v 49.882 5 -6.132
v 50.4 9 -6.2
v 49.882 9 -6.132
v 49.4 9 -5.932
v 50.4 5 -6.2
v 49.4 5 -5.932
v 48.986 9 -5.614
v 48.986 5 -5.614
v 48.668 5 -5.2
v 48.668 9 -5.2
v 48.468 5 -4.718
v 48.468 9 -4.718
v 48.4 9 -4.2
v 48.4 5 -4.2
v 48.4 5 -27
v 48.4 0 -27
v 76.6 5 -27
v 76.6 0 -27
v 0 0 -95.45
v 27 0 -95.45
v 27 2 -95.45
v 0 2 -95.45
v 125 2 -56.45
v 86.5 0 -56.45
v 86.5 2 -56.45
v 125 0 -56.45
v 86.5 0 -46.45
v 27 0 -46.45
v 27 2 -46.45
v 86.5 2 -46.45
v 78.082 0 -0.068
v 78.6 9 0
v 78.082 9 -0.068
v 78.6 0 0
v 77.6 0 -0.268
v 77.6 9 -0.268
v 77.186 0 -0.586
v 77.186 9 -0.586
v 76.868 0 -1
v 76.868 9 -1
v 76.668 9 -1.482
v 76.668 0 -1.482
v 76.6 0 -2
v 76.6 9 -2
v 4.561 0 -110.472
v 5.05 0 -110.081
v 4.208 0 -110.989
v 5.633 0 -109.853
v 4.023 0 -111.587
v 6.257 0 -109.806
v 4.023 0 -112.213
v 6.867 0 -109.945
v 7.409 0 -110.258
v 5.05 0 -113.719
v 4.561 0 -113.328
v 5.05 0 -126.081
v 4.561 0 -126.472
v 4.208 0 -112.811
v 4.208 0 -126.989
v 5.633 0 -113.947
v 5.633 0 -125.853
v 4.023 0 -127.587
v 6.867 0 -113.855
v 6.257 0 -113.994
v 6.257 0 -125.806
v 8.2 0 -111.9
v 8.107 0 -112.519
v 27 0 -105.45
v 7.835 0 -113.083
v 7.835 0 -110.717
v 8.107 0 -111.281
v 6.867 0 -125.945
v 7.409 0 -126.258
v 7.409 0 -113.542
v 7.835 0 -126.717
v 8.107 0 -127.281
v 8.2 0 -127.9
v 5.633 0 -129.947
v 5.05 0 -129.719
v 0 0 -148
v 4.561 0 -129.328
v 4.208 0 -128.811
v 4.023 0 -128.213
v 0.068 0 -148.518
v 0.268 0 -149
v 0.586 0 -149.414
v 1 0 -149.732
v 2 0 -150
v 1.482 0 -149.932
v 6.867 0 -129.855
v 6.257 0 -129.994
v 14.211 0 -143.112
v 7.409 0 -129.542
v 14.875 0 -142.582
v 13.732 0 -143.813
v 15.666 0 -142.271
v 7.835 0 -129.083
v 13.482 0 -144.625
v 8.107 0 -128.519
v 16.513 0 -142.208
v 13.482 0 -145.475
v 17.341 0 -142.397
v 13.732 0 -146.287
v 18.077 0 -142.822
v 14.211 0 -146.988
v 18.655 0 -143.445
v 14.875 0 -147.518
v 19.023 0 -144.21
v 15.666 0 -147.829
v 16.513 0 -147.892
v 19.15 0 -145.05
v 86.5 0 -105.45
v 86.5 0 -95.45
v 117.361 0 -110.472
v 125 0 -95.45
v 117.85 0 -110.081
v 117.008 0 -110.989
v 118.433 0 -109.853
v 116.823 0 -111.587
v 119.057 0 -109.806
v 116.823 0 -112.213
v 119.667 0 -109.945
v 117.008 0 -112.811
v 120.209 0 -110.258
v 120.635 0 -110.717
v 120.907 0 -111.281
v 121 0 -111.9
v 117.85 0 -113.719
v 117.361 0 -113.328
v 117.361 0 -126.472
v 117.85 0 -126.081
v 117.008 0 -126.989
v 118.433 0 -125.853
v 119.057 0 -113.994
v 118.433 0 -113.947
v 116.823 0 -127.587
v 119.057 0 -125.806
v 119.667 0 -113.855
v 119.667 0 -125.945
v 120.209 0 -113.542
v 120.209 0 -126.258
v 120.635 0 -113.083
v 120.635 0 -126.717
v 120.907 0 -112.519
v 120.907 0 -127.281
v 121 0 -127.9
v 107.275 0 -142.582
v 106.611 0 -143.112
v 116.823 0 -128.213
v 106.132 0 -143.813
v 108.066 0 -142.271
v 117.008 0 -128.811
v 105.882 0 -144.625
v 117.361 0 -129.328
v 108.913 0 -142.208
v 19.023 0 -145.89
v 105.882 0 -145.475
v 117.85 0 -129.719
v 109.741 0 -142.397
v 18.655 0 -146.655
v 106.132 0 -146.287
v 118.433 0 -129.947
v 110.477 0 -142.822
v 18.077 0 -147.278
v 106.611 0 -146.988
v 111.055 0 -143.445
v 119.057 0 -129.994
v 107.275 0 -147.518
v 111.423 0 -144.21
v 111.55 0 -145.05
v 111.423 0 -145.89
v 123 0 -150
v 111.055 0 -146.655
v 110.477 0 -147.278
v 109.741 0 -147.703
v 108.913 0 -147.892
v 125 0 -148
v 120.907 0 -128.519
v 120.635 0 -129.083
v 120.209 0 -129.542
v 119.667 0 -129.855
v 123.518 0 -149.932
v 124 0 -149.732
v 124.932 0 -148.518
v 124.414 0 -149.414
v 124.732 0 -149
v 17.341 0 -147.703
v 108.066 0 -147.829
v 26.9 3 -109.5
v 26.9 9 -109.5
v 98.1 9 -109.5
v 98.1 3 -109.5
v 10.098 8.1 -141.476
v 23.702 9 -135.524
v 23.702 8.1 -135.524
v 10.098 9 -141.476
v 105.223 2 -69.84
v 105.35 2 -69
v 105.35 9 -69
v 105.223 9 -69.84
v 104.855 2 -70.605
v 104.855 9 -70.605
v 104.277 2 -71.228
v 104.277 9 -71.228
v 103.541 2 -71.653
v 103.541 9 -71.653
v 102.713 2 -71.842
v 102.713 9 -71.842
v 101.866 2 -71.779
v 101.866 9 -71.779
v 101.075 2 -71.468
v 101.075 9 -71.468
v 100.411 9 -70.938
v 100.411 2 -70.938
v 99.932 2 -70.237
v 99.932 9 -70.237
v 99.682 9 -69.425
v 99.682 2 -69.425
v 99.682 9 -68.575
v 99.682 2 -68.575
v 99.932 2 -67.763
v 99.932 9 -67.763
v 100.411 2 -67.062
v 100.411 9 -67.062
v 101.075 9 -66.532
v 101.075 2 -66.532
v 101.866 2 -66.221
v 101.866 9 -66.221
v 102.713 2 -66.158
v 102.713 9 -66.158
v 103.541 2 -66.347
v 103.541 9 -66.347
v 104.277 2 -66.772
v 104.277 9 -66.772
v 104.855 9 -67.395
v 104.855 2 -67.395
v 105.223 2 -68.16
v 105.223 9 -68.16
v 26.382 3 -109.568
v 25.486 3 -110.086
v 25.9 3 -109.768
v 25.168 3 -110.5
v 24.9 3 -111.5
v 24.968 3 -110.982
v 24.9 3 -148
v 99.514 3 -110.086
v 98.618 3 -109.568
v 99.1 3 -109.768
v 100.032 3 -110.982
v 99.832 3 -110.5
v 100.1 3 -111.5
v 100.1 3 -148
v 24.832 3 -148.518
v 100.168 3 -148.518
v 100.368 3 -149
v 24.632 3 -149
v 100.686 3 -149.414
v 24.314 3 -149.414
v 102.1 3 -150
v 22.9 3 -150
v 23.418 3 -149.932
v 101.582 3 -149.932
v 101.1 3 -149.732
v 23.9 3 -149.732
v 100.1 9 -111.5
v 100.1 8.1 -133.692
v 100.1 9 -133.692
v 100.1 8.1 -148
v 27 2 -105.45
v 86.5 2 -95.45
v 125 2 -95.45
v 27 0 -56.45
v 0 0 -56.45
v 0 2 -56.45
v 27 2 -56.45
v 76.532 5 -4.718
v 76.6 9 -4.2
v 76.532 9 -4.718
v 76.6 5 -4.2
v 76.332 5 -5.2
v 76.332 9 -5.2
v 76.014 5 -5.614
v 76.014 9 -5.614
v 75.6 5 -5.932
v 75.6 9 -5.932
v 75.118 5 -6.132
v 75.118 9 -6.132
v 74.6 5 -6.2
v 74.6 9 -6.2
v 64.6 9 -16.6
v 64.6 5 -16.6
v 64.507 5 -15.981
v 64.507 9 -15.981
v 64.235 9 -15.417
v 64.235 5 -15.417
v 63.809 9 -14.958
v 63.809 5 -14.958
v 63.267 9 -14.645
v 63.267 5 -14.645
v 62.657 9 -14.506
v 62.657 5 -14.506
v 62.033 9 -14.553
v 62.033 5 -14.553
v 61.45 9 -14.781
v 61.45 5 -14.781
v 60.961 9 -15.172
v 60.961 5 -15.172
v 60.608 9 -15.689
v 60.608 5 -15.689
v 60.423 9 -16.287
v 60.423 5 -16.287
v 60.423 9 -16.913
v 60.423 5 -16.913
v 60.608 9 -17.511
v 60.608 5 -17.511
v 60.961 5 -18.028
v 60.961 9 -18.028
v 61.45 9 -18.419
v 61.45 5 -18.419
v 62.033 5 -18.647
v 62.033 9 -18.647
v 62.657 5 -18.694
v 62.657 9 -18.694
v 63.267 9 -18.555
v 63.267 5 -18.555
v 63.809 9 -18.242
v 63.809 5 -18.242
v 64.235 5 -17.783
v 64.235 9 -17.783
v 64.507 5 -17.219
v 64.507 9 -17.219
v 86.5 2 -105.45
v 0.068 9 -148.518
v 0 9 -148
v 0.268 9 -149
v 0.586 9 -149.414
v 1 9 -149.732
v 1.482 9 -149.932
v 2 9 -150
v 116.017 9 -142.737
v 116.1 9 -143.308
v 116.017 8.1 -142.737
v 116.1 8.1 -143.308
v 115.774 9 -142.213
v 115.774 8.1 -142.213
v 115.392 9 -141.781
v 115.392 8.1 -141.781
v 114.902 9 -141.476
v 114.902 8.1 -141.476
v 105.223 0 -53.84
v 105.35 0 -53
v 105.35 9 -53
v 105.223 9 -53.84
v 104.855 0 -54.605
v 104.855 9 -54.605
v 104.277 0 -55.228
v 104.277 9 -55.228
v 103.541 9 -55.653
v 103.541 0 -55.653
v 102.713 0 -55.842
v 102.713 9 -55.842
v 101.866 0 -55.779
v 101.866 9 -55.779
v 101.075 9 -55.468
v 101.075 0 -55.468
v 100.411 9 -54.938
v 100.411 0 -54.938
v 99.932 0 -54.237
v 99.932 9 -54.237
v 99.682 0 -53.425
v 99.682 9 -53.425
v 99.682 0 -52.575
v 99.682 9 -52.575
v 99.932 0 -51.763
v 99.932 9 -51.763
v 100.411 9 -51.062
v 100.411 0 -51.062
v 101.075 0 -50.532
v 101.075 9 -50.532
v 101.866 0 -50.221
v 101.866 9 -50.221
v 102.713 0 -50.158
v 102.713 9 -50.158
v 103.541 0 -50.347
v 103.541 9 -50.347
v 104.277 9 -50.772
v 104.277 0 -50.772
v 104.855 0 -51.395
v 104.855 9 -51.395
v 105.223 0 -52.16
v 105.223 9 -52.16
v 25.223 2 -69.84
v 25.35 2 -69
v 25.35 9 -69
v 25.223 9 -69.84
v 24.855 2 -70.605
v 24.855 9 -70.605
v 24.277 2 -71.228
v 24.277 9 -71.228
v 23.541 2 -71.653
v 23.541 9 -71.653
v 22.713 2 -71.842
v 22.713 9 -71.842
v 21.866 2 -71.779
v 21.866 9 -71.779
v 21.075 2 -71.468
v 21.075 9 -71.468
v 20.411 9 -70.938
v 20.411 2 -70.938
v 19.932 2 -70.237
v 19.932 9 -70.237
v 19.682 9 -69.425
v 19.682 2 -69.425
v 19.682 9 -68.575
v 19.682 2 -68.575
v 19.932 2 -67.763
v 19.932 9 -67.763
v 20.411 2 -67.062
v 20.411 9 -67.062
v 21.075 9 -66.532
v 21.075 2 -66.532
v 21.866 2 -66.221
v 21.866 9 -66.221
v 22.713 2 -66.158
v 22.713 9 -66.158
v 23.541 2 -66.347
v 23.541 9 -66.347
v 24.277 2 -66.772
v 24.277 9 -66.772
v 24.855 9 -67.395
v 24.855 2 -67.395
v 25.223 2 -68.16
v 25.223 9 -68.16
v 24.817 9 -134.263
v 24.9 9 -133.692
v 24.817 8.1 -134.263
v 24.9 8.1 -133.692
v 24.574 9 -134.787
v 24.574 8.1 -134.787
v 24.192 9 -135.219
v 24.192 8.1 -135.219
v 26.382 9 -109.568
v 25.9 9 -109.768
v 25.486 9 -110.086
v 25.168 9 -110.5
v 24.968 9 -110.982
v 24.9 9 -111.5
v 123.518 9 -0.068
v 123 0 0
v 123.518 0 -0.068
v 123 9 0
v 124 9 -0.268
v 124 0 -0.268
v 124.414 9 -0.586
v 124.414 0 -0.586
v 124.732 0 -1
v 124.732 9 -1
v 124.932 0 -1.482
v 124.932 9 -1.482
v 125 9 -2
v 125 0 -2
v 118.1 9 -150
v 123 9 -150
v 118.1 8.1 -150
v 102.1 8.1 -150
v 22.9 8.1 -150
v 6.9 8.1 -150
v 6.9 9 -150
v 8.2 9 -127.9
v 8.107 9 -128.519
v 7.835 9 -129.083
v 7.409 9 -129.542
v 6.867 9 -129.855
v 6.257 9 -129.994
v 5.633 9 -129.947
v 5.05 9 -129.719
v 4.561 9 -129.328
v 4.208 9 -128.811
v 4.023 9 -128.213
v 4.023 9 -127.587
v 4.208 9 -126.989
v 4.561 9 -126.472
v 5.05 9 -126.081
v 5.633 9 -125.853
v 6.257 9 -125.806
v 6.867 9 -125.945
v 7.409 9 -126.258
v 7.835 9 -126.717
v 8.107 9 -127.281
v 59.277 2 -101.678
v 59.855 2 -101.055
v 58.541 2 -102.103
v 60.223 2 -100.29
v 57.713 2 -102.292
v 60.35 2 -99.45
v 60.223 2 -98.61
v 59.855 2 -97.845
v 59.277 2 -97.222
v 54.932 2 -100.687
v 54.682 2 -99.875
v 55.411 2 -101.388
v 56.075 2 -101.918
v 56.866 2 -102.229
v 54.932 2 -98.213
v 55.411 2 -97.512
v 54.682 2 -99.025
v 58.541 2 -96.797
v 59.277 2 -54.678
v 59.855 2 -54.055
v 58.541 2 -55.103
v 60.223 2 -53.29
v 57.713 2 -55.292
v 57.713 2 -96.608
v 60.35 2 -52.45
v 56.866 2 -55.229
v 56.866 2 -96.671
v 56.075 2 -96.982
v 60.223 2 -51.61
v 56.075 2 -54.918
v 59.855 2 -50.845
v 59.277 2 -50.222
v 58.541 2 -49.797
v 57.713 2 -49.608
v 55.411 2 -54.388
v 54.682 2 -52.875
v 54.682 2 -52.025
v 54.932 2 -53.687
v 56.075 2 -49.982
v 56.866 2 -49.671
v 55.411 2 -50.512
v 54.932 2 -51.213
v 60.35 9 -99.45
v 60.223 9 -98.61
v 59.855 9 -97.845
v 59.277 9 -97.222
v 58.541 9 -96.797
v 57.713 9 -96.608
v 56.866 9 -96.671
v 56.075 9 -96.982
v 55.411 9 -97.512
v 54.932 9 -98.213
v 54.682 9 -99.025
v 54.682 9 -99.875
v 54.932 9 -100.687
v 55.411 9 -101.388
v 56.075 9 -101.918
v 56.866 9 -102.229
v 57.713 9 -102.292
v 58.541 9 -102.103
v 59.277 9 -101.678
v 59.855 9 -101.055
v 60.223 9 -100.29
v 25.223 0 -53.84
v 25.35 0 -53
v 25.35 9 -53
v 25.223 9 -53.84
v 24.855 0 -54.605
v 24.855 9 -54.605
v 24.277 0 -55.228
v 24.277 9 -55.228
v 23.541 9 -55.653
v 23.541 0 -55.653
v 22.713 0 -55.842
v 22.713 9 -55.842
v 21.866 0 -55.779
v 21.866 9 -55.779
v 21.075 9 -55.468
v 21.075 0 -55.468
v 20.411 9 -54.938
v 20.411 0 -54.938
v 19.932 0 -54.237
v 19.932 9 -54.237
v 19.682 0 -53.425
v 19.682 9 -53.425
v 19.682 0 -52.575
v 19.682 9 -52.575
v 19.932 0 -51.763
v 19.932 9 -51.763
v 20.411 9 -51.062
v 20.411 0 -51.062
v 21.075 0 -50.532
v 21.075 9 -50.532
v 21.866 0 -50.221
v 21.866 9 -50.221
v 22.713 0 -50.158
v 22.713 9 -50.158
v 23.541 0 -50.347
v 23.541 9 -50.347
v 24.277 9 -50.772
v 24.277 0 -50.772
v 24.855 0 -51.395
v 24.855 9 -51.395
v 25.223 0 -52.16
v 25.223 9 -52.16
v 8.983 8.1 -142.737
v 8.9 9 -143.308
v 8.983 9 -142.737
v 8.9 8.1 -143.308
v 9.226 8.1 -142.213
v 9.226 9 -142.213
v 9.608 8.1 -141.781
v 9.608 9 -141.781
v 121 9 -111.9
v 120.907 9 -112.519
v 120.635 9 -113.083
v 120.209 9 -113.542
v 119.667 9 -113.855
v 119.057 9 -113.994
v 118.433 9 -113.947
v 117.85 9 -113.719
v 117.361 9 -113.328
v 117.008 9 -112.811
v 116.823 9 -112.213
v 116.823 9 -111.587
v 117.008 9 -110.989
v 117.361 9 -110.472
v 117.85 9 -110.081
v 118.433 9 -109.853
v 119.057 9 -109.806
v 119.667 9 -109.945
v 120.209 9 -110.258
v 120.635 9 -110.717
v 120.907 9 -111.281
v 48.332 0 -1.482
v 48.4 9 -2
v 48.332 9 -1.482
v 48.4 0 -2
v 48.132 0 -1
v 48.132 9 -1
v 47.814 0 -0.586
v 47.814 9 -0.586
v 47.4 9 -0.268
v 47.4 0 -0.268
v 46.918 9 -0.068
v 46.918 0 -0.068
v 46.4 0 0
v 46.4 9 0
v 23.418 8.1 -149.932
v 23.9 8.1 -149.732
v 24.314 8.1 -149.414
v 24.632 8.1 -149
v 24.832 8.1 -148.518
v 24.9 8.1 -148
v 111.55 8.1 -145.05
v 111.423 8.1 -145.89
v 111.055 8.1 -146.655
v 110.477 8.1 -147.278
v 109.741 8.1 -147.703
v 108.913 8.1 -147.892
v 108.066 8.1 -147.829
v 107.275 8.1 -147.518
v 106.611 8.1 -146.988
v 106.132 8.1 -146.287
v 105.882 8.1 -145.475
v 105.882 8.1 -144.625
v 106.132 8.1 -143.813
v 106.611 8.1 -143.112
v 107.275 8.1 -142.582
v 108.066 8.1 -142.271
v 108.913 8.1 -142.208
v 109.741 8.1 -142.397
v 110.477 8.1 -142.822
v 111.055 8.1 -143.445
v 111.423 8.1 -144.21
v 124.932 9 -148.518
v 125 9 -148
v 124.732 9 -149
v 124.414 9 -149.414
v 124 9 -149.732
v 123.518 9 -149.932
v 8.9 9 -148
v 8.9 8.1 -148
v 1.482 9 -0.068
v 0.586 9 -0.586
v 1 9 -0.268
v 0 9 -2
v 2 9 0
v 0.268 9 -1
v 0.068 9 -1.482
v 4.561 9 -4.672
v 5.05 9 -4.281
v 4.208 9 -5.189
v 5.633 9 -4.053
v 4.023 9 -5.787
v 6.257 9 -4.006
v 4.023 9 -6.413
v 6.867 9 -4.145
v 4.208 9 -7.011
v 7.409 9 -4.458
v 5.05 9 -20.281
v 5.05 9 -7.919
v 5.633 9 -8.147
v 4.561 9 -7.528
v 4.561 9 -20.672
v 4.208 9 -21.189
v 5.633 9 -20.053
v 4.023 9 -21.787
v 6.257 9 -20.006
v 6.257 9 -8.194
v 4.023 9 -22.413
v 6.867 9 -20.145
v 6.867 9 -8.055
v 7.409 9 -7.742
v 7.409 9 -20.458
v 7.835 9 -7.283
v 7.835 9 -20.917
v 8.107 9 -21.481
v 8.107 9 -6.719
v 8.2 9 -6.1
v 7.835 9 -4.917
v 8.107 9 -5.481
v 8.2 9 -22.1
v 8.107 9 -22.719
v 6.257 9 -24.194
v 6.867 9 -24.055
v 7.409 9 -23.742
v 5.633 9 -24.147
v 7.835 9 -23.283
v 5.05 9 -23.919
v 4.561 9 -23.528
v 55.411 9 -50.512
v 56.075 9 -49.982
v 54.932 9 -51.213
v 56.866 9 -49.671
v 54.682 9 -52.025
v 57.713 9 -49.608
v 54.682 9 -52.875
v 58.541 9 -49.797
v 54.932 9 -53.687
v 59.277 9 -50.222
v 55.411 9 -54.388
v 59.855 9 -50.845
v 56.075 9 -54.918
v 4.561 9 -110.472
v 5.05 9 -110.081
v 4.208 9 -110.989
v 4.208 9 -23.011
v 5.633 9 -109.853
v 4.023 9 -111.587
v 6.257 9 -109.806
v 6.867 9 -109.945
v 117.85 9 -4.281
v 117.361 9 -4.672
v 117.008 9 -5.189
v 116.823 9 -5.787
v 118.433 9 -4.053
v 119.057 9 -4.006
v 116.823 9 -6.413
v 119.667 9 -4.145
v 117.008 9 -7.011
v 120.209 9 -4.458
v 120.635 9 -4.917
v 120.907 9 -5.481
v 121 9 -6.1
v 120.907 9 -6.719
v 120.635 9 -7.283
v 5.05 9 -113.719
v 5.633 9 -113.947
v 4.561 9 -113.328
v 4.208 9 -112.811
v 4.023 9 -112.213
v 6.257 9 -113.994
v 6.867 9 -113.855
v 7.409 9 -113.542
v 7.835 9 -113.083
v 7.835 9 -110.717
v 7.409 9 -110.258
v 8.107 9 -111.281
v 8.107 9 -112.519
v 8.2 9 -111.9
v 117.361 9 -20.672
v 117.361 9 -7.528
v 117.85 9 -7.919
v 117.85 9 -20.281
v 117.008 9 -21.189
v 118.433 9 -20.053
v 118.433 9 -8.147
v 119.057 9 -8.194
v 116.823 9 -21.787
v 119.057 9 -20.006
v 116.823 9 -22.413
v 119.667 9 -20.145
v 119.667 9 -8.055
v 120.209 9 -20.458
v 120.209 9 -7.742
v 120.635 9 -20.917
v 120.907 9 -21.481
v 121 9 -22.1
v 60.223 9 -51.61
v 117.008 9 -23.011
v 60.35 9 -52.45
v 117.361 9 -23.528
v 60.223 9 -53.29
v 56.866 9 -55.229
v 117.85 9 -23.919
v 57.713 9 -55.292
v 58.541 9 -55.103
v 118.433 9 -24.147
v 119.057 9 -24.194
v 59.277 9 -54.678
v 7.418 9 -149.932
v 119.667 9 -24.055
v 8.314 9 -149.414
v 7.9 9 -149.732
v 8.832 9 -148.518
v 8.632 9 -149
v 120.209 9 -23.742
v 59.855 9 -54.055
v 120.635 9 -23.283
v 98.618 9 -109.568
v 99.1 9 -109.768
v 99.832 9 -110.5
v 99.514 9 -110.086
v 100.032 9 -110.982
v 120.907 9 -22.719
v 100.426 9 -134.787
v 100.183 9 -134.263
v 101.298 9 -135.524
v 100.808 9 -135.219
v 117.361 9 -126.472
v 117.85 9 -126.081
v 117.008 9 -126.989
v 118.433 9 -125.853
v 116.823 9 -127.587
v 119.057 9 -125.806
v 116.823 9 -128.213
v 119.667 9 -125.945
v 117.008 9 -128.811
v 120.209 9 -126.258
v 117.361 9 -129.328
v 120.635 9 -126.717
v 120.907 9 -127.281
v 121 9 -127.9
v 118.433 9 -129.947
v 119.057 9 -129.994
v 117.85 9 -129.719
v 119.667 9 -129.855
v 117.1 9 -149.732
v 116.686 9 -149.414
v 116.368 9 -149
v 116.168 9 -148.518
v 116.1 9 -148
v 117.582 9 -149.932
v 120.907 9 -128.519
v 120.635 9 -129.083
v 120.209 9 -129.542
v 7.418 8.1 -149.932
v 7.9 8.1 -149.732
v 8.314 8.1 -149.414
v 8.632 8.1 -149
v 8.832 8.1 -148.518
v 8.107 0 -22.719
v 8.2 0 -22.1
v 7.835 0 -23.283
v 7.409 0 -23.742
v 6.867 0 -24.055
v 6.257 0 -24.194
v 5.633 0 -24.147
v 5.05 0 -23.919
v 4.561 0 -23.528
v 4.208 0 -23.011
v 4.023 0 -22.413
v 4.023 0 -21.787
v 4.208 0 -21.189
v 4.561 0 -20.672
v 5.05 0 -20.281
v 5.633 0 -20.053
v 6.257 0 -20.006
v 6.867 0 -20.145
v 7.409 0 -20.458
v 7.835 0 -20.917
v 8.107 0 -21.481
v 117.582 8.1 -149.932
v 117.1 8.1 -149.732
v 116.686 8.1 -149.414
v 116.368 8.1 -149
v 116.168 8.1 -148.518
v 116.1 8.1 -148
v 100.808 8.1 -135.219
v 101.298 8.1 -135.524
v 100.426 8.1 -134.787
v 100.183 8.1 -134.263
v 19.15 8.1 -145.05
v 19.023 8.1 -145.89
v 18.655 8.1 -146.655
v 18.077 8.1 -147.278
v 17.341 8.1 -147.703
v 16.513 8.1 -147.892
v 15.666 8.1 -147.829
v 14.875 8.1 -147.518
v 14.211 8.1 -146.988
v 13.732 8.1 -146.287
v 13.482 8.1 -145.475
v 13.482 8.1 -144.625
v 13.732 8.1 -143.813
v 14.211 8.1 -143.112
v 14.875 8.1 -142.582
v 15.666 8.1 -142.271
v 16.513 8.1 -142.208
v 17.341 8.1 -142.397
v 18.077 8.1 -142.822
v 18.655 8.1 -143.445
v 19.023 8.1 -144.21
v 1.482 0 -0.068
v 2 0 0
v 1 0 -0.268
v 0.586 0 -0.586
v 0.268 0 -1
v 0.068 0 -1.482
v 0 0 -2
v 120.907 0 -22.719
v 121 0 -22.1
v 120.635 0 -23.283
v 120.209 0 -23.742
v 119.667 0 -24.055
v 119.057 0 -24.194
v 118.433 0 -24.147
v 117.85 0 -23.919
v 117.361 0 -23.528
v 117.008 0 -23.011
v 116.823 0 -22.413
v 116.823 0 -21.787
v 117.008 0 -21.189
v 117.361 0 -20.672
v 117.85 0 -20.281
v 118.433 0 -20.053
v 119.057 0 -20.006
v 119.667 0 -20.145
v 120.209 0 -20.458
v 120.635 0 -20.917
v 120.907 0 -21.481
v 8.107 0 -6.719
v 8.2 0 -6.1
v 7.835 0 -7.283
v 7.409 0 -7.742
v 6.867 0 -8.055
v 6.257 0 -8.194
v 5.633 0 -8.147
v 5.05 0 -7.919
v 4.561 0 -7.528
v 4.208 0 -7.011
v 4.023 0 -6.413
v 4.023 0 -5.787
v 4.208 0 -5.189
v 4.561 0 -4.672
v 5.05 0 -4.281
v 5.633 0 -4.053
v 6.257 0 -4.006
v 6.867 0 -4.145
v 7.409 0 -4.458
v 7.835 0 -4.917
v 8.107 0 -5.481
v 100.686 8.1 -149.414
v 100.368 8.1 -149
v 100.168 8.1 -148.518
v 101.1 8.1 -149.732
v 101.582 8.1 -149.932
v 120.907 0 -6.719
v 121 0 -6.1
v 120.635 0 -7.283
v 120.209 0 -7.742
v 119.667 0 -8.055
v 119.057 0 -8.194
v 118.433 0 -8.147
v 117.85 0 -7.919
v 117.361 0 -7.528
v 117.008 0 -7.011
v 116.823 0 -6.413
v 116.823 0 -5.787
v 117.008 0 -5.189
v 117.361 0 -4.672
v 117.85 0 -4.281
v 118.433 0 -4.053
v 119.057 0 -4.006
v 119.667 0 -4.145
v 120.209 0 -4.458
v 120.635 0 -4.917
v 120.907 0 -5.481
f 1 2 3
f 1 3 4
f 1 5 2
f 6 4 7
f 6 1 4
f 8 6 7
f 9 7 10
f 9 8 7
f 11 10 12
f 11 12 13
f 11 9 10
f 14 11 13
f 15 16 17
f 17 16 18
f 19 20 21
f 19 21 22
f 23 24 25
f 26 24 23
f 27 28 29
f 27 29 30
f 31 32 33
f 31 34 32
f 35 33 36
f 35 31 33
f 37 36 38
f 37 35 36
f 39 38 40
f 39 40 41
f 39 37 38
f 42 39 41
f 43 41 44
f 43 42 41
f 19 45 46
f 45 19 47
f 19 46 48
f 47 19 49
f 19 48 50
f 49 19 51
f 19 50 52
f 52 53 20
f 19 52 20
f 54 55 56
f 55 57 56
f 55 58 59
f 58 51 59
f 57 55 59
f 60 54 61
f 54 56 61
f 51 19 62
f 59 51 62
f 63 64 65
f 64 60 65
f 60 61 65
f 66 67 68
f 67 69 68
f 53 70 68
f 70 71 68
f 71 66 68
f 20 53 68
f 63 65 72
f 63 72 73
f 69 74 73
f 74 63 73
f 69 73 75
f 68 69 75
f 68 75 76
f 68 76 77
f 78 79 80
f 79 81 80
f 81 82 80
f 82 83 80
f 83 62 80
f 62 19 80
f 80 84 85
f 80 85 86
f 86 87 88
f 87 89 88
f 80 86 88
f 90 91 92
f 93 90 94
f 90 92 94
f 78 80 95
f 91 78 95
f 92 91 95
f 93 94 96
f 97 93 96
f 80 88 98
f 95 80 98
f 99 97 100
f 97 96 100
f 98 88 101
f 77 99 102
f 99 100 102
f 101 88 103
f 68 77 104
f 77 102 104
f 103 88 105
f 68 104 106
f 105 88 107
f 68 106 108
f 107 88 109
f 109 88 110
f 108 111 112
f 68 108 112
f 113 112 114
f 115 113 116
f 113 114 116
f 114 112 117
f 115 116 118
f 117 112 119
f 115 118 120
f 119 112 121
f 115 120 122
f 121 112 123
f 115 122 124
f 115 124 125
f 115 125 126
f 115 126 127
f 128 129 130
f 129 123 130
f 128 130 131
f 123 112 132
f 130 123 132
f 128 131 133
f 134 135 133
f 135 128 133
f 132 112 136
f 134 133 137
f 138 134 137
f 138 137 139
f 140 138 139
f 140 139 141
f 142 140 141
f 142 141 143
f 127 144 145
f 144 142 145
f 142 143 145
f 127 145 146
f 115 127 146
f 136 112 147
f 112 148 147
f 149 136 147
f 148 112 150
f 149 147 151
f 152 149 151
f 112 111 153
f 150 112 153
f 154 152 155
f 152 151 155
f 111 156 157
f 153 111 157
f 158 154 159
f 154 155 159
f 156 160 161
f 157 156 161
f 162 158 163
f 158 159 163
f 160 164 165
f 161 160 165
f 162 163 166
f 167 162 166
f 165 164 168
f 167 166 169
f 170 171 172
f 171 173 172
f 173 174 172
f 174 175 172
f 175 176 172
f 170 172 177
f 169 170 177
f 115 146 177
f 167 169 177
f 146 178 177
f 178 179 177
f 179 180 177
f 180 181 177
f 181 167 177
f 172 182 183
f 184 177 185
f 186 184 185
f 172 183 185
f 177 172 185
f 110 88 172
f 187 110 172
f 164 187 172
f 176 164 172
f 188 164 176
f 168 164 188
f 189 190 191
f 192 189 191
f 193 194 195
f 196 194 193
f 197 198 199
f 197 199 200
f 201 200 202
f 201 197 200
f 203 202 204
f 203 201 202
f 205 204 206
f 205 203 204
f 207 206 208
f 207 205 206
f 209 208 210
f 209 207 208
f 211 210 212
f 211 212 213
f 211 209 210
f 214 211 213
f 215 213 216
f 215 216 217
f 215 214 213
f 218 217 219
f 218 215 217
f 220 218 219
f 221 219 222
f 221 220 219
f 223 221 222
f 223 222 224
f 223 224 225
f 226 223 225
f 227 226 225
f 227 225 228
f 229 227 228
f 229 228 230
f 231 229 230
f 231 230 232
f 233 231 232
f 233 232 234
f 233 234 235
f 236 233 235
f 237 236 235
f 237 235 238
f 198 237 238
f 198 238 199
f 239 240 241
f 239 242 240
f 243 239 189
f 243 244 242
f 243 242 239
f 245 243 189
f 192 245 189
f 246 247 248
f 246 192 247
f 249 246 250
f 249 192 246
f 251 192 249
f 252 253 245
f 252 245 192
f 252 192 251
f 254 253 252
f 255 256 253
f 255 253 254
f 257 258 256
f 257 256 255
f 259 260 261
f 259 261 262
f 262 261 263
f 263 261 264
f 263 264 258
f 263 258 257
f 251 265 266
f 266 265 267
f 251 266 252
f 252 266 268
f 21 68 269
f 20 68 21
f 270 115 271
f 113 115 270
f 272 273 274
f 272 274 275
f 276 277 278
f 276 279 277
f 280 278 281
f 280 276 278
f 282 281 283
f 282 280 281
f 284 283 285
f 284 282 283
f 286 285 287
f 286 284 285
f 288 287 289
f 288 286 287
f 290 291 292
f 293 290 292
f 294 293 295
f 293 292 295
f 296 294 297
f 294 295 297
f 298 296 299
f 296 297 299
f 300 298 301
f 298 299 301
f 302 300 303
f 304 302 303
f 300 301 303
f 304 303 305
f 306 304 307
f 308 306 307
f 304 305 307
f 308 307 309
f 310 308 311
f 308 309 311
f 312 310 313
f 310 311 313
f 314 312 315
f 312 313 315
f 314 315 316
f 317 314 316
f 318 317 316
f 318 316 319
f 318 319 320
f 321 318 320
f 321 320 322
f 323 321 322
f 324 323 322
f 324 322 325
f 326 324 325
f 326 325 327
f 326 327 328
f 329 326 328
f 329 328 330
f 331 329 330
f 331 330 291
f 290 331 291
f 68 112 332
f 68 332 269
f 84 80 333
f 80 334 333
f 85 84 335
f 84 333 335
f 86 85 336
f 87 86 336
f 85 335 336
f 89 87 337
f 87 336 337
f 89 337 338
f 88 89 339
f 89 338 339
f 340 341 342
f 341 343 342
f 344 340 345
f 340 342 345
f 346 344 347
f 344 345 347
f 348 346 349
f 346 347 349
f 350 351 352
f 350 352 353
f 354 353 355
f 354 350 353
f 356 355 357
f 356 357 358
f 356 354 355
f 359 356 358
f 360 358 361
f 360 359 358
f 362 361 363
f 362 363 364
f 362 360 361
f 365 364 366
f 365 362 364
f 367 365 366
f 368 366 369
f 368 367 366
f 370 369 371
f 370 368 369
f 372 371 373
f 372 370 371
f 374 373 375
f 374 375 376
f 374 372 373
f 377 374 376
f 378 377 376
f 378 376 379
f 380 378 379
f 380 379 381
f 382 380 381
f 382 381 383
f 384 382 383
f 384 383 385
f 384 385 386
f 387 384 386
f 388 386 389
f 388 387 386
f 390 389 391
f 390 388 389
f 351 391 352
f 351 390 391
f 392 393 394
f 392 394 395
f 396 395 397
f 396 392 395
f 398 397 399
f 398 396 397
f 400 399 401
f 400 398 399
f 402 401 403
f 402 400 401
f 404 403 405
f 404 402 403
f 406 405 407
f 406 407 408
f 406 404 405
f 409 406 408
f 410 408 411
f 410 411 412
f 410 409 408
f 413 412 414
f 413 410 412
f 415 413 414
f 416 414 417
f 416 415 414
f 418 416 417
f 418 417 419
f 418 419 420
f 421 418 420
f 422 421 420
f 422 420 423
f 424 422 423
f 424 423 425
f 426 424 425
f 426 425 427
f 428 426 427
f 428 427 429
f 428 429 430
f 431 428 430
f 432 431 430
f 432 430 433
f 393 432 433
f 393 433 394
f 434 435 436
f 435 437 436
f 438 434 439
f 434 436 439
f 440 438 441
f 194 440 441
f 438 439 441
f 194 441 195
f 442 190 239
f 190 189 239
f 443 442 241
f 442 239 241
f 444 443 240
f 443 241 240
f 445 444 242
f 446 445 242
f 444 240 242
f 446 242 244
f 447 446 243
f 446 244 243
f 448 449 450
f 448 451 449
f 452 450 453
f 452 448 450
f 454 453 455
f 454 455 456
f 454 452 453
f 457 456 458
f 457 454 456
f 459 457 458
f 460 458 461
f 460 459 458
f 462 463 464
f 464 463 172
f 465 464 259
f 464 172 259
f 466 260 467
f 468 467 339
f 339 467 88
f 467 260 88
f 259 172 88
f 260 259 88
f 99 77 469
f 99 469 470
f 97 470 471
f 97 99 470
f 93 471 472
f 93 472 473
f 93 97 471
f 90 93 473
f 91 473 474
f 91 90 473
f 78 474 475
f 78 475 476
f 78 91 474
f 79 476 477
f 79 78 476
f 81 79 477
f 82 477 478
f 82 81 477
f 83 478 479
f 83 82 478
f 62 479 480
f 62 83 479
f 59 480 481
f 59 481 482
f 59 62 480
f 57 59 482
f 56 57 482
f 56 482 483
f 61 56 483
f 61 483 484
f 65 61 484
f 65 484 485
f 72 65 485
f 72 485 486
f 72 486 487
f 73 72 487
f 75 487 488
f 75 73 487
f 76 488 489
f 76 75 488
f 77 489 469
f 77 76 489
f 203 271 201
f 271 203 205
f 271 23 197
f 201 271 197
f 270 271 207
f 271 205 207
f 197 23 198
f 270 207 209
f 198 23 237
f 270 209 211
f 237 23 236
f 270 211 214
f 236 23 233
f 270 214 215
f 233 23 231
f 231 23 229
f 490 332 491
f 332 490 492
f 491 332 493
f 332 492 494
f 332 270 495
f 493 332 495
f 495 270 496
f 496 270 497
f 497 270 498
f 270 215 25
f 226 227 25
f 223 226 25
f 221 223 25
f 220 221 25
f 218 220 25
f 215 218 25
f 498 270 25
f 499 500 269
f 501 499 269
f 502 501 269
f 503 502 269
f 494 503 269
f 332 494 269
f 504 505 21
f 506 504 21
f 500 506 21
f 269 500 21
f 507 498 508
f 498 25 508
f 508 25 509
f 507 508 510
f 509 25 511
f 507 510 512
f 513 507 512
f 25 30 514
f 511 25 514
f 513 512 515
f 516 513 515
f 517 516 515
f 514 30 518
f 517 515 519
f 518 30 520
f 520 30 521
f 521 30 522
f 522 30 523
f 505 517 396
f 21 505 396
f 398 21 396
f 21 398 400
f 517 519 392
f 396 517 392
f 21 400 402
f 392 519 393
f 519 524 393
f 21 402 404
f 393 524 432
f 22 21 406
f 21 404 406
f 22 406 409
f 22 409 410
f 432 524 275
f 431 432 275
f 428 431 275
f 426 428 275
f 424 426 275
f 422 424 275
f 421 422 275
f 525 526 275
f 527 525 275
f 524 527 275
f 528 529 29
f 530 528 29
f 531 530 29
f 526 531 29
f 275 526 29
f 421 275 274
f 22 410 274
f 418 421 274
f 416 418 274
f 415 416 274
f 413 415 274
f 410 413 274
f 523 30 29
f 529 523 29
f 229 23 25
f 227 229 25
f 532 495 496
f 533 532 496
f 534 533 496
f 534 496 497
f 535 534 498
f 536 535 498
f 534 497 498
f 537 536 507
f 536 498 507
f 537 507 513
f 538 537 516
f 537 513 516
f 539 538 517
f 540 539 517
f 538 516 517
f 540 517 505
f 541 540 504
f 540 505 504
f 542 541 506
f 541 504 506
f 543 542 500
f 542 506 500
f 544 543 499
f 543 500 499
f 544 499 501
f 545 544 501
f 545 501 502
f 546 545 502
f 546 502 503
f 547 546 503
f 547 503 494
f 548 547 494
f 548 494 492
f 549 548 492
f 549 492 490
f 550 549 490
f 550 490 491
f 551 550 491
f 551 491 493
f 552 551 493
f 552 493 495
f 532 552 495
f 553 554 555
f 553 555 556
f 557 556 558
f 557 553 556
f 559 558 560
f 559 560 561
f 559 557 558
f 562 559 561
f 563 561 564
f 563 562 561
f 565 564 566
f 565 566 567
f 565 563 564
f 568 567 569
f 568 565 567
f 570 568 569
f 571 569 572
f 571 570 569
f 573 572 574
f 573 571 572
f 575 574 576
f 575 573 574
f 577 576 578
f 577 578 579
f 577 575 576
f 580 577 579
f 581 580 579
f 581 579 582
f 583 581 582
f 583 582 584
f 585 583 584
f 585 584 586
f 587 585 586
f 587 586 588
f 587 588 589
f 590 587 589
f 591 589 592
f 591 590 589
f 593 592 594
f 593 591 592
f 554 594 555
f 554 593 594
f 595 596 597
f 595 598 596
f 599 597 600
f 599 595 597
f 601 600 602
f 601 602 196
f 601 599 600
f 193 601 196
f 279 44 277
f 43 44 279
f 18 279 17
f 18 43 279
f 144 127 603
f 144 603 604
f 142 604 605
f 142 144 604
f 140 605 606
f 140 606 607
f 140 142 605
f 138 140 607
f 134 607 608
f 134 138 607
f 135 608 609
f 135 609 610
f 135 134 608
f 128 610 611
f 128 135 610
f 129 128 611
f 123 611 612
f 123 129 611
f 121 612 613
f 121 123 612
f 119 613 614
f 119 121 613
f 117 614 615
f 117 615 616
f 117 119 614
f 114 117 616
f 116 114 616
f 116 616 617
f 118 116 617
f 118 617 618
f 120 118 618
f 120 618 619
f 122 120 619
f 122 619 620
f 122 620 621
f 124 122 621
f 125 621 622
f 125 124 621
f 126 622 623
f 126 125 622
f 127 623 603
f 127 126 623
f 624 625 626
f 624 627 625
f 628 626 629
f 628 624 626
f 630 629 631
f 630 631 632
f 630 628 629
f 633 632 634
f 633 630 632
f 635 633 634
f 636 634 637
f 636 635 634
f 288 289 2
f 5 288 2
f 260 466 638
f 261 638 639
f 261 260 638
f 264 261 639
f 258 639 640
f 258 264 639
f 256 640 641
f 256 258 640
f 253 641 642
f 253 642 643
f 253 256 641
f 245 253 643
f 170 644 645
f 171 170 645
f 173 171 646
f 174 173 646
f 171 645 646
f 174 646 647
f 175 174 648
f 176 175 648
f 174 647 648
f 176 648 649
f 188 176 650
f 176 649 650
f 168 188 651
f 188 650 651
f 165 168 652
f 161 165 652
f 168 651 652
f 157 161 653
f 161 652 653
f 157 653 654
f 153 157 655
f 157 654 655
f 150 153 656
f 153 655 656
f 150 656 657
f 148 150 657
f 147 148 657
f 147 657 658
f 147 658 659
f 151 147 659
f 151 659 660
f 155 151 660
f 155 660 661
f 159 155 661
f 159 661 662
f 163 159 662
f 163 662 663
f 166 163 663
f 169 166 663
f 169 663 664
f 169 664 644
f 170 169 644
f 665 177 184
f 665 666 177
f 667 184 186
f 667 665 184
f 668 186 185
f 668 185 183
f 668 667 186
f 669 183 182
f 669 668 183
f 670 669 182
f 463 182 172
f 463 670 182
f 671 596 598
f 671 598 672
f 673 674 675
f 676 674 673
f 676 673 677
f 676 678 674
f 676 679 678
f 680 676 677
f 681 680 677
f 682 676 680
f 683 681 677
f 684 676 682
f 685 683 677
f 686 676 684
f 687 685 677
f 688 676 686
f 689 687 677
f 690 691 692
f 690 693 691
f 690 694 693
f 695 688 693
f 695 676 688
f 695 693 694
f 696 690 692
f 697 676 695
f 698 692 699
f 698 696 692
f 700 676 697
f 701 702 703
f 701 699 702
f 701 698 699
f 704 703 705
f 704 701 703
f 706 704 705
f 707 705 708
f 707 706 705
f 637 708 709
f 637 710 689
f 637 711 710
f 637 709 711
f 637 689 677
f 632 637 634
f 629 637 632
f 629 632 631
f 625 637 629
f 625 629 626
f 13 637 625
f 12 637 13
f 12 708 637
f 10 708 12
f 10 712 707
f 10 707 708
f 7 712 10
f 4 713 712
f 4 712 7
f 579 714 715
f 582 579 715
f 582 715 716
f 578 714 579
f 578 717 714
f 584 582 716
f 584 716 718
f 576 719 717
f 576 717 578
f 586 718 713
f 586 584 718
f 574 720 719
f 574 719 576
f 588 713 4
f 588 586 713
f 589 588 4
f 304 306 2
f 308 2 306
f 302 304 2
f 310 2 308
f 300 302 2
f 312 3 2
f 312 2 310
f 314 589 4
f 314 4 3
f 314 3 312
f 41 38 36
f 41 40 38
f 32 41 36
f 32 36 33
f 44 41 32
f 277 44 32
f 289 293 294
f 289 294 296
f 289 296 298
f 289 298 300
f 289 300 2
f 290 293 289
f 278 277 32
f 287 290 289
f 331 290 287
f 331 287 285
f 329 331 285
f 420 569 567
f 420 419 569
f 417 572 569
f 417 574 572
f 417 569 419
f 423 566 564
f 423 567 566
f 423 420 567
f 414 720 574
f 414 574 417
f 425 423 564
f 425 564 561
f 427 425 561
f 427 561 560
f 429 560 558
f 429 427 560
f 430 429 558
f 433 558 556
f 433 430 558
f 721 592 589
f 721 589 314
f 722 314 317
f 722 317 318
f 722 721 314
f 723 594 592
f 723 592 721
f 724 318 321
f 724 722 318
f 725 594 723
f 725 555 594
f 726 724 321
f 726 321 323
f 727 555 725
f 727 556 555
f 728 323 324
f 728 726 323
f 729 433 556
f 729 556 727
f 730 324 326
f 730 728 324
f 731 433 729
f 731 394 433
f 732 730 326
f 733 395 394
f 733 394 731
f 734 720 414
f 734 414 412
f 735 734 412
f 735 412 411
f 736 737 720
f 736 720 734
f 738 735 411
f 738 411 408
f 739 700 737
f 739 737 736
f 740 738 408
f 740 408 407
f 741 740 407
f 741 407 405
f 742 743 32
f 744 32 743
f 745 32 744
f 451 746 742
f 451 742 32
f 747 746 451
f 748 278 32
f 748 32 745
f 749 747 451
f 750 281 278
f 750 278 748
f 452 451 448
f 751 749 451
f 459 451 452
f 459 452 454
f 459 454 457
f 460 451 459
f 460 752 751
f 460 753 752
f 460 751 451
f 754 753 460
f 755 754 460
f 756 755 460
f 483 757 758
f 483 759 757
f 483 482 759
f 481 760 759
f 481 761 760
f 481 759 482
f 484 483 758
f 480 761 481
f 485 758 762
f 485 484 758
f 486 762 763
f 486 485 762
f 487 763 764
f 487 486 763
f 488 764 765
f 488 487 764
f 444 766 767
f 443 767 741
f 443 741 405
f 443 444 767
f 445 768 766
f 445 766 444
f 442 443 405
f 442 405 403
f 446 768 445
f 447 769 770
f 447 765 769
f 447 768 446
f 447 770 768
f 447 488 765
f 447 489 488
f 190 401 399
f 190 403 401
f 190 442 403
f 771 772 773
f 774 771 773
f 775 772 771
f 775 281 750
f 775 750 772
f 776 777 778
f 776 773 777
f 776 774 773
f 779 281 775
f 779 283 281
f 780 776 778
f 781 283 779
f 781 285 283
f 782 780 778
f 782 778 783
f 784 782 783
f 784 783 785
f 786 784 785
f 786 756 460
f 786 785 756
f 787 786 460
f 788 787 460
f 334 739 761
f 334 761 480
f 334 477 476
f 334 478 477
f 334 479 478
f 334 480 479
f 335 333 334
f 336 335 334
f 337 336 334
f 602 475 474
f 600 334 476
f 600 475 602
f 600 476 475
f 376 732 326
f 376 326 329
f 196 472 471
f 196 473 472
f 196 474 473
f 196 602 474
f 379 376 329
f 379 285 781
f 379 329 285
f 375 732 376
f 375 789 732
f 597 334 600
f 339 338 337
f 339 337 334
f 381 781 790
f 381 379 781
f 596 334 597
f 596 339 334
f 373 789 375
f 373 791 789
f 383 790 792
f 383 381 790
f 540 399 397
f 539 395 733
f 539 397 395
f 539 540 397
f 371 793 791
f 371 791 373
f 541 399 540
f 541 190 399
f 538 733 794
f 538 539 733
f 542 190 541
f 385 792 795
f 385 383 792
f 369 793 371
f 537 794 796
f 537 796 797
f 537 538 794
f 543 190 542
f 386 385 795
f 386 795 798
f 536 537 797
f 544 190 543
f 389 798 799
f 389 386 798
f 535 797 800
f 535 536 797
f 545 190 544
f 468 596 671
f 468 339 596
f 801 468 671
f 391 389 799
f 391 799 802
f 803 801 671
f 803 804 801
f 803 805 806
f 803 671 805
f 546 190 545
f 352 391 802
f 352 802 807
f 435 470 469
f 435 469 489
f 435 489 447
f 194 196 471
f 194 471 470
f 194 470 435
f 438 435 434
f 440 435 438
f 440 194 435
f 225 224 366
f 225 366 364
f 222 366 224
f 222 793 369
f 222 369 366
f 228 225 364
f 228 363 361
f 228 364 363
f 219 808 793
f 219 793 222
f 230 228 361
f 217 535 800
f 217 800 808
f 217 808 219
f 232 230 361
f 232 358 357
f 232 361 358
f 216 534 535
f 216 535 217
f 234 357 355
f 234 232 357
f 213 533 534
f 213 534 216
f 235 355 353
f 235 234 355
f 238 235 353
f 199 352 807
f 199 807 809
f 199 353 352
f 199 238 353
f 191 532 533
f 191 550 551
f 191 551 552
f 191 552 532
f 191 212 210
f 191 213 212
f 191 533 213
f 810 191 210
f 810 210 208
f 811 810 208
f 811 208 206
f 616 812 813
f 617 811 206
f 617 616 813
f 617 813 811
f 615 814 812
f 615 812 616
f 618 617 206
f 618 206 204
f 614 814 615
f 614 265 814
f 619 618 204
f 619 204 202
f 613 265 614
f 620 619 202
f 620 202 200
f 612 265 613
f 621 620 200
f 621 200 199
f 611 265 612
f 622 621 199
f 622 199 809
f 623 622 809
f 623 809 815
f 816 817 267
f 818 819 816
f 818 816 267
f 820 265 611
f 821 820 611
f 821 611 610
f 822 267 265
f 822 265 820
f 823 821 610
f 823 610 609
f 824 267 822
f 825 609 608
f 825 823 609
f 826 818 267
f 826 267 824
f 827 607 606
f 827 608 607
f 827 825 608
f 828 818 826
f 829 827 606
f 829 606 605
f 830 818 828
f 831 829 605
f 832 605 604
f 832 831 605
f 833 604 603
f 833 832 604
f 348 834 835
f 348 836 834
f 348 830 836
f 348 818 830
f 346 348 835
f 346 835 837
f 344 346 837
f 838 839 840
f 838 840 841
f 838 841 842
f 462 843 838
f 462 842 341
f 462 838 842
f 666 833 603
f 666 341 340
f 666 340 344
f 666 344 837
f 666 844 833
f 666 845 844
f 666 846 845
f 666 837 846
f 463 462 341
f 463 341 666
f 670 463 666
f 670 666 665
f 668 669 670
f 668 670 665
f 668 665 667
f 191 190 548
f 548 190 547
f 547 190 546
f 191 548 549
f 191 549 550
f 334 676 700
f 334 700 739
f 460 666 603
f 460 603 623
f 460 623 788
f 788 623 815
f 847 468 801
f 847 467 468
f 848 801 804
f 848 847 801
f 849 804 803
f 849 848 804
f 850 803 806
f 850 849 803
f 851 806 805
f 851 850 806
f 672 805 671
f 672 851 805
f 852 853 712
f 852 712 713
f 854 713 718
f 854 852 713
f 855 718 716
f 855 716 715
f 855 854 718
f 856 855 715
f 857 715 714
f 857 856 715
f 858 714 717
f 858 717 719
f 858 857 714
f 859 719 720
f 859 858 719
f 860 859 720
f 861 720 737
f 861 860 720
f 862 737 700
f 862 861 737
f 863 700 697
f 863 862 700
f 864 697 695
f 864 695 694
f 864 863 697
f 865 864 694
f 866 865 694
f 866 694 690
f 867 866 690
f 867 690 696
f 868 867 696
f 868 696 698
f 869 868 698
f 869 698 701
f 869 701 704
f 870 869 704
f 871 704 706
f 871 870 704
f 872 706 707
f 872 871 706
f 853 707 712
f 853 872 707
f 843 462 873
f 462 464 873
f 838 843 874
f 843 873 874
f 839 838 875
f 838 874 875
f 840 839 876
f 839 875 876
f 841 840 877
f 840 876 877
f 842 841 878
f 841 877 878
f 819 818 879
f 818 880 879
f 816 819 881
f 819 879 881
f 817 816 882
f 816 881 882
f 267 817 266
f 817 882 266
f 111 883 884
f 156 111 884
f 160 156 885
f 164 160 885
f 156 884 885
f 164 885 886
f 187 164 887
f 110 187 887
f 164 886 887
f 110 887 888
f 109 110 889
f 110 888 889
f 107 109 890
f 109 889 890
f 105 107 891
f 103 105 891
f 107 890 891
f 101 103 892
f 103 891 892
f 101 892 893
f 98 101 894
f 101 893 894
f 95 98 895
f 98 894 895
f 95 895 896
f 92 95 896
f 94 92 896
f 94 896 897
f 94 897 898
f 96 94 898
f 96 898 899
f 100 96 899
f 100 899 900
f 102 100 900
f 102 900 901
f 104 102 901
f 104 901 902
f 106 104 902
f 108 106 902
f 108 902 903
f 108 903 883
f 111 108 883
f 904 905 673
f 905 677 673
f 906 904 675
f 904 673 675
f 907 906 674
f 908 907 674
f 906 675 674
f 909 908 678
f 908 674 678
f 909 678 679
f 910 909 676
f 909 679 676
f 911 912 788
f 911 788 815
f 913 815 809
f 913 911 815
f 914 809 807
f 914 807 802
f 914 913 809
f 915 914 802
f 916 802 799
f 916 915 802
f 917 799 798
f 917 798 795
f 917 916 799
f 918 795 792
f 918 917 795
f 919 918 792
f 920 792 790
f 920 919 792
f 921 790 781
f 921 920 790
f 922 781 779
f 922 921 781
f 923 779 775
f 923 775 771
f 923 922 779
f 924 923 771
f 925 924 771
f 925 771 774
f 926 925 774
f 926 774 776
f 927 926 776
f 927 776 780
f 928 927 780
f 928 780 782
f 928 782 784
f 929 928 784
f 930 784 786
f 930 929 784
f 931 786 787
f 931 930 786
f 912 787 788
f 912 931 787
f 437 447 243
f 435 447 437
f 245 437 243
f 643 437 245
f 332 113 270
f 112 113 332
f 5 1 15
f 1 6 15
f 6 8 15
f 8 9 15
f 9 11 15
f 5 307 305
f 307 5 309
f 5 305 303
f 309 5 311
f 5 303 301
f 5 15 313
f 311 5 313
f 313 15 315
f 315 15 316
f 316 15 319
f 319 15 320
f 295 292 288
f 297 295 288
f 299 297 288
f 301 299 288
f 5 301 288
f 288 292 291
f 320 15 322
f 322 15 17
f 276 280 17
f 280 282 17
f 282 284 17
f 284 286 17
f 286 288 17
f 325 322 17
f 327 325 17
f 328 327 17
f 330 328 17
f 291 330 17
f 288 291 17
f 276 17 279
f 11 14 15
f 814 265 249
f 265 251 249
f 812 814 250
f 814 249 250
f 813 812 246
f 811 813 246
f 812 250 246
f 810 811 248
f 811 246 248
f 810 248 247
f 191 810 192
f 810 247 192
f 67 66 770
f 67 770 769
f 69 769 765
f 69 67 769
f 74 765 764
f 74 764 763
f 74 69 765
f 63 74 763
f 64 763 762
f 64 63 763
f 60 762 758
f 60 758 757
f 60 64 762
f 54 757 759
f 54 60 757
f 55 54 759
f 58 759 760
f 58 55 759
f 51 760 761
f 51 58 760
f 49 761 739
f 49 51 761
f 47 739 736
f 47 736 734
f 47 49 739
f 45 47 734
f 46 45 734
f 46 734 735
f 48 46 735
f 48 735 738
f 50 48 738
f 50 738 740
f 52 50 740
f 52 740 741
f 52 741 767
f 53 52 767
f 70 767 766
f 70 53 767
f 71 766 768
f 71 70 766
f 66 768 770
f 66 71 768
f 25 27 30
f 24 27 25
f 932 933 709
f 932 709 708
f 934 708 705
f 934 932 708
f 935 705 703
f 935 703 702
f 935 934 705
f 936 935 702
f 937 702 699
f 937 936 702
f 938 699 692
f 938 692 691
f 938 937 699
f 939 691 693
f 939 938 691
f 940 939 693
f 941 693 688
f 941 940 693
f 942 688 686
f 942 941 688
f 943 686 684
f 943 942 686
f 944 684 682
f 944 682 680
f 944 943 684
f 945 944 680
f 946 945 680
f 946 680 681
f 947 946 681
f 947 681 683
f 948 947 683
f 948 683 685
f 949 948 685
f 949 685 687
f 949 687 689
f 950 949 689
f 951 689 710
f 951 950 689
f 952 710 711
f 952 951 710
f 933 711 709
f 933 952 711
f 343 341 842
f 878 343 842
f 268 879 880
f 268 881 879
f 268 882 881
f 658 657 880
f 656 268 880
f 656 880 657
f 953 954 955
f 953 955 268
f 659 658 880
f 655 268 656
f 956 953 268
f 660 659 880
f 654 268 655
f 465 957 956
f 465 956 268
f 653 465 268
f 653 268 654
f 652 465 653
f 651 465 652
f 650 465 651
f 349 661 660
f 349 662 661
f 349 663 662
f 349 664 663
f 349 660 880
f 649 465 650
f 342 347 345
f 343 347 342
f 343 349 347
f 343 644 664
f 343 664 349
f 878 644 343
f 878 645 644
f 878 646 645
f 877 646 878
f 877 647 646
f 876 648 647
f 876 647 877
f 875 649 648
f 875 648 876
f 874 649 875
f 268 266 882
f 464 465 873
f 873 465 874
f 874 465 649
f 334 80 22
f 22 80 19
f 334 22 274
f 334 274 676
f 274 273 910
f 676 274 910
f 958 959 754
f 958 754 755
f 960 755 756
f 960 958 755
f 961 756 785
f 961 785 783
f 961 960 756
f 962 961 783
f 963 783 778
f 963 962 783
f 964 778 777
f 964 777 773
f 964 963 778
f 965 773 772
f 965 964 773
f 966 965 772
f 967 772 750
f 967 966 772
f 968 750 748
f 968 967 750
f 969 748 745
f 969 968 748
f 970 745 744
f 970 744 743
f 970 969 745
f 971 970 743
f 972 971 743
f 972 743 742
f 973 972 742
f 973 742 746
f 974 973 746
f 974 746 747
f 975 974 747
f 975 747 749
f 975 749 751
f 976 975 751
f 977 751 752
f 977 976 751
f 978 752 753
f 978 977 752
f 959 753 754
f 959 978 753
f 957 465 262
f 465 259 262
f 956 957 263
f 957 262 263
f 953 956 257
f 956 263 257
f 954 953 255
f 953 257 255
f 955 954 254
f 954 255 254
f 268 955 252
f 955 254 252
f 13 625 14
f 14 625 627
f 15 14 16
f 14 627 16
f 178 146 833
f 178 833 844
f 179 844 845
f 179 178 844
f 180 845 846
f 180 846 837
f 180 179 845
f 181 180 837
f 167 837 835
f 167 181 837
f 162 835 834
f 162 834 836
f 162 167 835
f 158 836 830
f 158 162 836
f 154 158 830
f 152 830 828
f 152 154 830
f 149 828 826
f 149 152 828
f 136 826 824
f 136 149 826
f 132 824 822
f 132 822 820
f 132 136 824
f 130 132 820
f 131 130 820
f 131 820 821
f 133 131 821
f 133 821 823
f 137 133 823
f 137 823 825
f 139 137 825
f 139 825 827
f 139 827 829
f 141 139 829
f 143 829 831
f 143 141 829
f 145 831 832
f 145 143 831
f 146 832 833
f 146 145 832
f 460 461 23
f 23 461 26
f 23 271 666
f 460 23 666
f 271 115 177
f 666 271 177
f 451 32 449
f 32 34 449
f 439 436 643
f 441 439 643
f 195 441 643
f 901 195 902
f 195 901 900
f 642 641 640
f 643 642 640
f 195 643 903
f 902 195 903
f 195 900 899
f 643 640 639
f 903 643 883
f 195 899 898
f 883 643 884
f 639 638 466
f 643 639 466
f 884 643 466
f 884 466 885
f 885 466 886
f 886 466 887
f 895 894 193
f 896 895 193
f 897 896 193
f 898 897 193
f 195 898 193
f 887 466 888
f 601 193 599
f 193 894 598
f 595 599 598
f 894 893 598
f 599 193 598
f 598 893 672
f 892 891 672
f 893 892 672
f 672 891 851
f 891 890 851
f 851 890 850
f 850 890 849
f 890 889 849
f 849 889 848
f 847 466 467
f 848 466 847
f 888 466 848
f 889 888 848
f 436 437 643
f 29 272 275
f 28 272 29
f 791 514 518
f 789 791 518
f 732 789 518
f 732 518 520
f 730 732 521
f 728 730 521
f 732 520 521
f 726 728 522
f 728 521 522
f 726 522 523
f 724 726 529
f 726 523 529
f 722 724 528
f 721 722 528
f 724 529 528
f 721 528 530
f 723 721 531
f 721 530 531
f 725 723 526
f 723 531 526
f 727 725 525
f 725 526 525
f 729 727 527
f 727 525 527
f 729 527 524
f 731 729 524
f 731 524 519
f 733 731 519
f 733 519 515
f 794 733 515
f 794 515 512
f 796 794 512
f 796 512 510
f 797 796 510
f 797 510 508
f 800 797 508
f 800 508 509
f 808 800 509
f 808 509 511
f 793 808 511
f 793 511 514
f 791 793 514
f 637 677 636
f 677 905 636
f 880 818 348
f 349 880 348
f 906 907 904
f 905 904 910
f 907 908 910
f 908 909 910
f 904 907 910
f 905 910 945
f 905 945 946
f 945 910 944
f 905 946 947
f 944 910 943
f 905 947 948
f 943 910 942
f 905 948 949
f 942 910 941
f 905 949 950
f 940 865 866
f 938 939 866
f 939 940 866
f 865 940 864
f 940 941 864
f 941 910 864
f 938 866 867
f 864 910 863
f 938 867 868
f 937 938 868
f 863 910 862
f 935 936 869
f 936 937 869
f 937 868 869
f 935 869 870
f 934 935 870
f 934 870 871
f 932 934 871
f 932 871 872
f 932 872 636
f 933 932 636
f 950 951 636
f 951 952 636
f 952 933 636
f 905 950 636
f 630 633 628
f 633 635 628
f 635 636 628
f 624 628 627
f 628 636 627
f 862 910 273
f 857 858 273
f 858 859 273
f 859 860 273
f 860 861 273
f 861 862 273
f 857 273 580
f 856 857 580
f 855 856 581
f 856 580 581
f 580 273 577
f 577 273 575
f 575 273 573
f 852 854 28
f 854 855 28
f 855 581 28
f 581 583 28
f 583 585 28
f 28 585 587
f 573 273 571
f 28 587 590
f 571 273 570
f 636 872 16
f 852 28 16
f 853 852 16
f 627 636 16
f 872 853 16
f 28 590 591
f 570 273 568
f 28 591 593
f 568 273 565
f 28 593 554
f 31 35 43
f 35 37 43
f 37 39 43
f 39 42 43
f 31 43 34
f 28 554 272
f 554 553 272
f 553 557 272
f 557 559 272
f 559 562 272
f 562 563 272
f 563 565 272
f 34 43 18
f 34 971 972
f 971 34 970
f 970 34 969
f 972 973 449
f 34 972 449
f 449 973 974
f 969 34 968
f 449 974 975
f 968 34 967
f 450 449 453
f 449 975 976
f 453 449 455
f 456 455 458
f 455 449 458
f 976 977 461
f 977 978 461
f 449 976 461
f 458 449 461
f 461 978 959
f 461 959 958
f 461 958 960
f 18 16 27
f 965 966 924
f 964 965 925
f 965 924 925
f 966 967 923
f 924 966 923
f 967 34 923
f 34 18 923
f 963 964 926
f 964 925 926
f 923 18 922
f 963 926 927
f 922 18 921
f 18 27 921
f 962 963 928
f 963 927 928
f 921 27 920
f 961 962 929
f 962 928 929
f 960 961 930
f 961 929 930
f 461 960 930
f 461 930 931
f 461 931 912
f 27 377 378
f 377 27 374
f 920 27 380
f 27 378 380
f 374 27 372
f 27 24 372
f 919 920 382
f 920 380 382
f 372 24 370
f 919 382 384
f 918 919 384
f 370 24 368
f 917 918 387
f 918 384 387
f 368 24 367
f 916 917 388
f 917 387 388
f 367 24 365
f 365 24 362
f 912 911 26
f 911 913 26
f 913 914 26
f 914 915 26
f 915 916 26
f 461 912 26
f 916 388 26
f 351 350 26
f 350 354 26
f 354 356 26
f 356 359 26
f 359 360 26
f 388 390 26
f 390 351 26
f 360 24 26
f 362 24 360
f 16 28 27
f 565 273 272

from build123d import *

# Parameters (mm, degrees)
SKETCH1_R           = 2.1
SKETCH1_R_2         = 2.85
BOSS_EXTRUDE1_DEPTH = 9
CUT_EXTRUDE1_DEPTH  = 4
SKETCH10_W          = 28.2
SKETCH10_H          = 42
CUT_EXTRUDE8_DEPTH  = 5
SKETCH11_R          = 2.1
CUT_EXTRUDE9_DEPTH  = 5
CUT_EXTRUDE2_DEPTH  = 2
SKETCH5_R           = 2.85
CUT_EXTRUDE3_DEPTH  = 8
SKETCH7_W           = 75.2
SKETCH7_H           = 40.5
CUT_EXTRUDE5_DEPTH  = 6
SKETCH12_R          = 2.85
CUT_EXTRUDE10_DEPTH = 10
CUT_EXTRUDE11_DEPTH = 0.9
FILLET1_R           = 2
FILLET2_R           = 2
FILLET3_R           = 2


with BuildPart() as part:
    # Sketch1 → Boss-Extrude1 (new body)
    with BuildSketch(Plane(origin=(0, 0, 0), x_dir=(1, 0, 0), z_dir=(0, 1, 0))):
        Polygon((76.6, 0), (125, 0), (125, 150), (0, 150), (0, 0), (48.4, 0), (48.4, -15), (76.6, -15), align=None)
        with Locations((6.1, 127.9)):
            Circle(SKETCH1_R, mode=Mode.SUBTRACT)
        with Locations((6.1, 111.9)):
            Circle(SKETCH1_R, mode=Mode.SUBTRACT)
        with Locations((118.9, 127.9)):
            Circle(SKETCH1_R, mode=Mode.SUBTRACT)
        with Locations((118.9, 111.9)):
            Circle(SKETCH1_R, mode=Mode.SUBTRACT)
        with Locations((118.9, 22.1)):
            Circle(SKETCH1_R, mode=Mode.SUBTRACT)
        with Locations((118.9, 6.1)):
            Circle(SKETCH1_R, mode=Mode.SUBTRACT)
        with Locations((6.1, 6.1)):
            Circle(SKETCH1_R, mode=Mode.SUBTRACT)
        with Locations((6.1, 22.1)):
            Circle(SKETCH1_R, mode=Mode.SUBTRACT)
        with Locations((54.5, -8.9)):
            Circle(SKETCH1_R, mode=Mode.SUBTRACT)
        with Locations((70.5, -8.9)):
            Circle(SKETCH1_R, mode=Mode.SUBTRACT)
        with Locations((62.5, -0.9)):
            Circle(SKETCH1_R, mode=Mode.SUBTRACT)
        with Locations((102.5, 53)):
            Circle(SKETCH1_R_2, mode=Mode.SUBTRACT)
        with Locations((22.5, 69)):
            Circle(SKETCH1_R_2, mode=Mode.SUBTRACT)
        with Locations((102.5, 69)):
            Circle(SKETCH1_R_2, mode=Mode.SUBTRACT)
        with Locations((22.5, 53)):
            Circle(SKETCH1_R_2, mode=Mode.SUBTRACT)
    extrude(amount=BOSS_EXTRUDE1_DEPTH)

    # Sketch2 → Cut-Extrude1 (cut)
    with BuildSketch(Plane(origin=(0, 9, 0), x_dir=(1, 0, 0), z_dir=(0, 1, 0))):
        Polygon((76.6, -15), (76.6, 0), (76.6, 6.2), (48.4, 6.2), (48.4, 0), (48.4, -15), align=None)
    extrude(amount=-CUT_EXTRUDE1_DEPTH, mode=Mode.SUBTRACT)

    # Sketch10 → Cut-Extrude8 (cut)
    with BuildSketch(Plane(origin=(0, 0, 0), x_dir=(1, 0, 0), z_dir=(0, 1, 0))):
        with Locations((62.5, 6)):
            Rectangle(SKETCH10_W, SKETCH10_H)
    extrude(amount=CUT_EXTRUDE8_DEPTH, mode=Mode.SUBTRACT)

    # Sketch11 → Cut-Extrude9 (cut, through all)
    with BuildSketch(Plane.XZ.offset(-5)):
        with Locations((62.5, -16.6)):
            Circle(SKETCH11_R)
    extrude(amount=-CUT_EXTRUDE9_DEPTH, mode=Mode.SUBTRACT)

    # Sketch3 → Cut-Extrude2 (cut)
    with BuildSketch(Plane.XZ):
        Polygon((0, -56.45), (27, -56.45), (27, -46.45), (86.5, -46.45), (86.5, -56.45), (125, -56.45), (125, -95.45), (86.5, -95.45), (86.5, -105.45), (27, -105.45), (27, -95.45), (0, -95.45), align=None)
    extrude(amount=-CUT_EXTRUDE2_DEPTH, mode=Mode.SUBTRACT)

    # Sketch5 → Cut-Extrude3 (cut, through all)
    with BuildSketch(Plane.XZ.offset(-2)):
        with Locations((57.5, -52.45)):
            Circle(SKETCH5_R)
        with Locations((57.5, -99.45)):
            Circle(SKETCH5_R)
    extrude(amount=-CUT_EXTRUDE3_DEPTH, mode=Mode.SUBTRACT)

    # Sketch7 → Cut-Extrude5 (cut)
    with BuildSketch(Plane(origin=(0, 9, 0), x_dir=(1, 0, 0), z_dir=(0, 1, 0))):
        with Locations((62.5, 129.75)):
            Rectangle(SKETCH7_W, SKETCH7_H)
    extrude(amount=-CUT_EXTRUDE5_DEPTH, mode=Mode.SUBTRACT)

    # Sketch12 → Cut-Extrude10 (cut, through all)
    with BuildSketch(Plane(origin=(0, 9, 0), x_dir=(1, 0, 0), z_dir=(0, 1, 0))):
        with Locations((16.3, 145.05)):
            Circle(SKETCH12_R)
        with Locations((108.7, 145.05)):
            Circle(SKETCH12_R)
    extrude(amount=-CUT_EXTRUDE10_DEPTH, mode=Mode.SUBTRACT)

    # Sketch13 → Cut-Extrude11 (cut)
    with BuildSketch(Plane(origin=(0, 9, 0), x_dir=(1, 0, 0), z_dir=(0, 1, 0))):
        Polygon((24.9, 135), (8.9, 142), (8.9, 150), (24.9, 150), align=None)
        Polygon((100.1, 150), (100.1, 135), (116.1, 142), (116.1, 150), align=None)
    extrude(amount=-CUT_EXTRUDE11_DEPTH, mode=Mode.SUBTRACT)

    # Fillet1
    fillet1_edges = [part.edges().sort_by_distance(p)[0] for p in [
        (0, 4.5, -150),
        (125, 4.5, -150),
        (125, 4.5, 0),
        (0, 4.5, 0),
        (76.6, 7, -6.2),
        (48.4, 7, -6.2),
    ]]
    fillet(fillet1_edges, radius=FILLET1_R)

    # Fillet2
    fillet2_edges = [part.edges().sort_by_distance(p)[0] for p in [
        (76.6, 4.5, 0),
        (48.4, 4.5, 0),
    ]]
    fillet(fillet2_edges, radius=FILLET2_R)

    # Fillet3
    fillet3_edges = [part.edges().sort_by_distance(p)[0] for p in [
        (24.9, 6, -109.5),
        (24.9, 5.55, -150),
        (100.1, 5.55, -150),
        (100.1, 6, -109.5),
        (8.9, 8.55, -150),
        (8.9, 8.55, -142),
        (24.9, 8.55, -135),
        (100.1, 8.55, -135),
        (116.1, 8.55, -142),
        (116.1, 8.55, -150),
    ]]
    fillet(fillet3_edges, radius=FILLET3_R)


solid = part.part
